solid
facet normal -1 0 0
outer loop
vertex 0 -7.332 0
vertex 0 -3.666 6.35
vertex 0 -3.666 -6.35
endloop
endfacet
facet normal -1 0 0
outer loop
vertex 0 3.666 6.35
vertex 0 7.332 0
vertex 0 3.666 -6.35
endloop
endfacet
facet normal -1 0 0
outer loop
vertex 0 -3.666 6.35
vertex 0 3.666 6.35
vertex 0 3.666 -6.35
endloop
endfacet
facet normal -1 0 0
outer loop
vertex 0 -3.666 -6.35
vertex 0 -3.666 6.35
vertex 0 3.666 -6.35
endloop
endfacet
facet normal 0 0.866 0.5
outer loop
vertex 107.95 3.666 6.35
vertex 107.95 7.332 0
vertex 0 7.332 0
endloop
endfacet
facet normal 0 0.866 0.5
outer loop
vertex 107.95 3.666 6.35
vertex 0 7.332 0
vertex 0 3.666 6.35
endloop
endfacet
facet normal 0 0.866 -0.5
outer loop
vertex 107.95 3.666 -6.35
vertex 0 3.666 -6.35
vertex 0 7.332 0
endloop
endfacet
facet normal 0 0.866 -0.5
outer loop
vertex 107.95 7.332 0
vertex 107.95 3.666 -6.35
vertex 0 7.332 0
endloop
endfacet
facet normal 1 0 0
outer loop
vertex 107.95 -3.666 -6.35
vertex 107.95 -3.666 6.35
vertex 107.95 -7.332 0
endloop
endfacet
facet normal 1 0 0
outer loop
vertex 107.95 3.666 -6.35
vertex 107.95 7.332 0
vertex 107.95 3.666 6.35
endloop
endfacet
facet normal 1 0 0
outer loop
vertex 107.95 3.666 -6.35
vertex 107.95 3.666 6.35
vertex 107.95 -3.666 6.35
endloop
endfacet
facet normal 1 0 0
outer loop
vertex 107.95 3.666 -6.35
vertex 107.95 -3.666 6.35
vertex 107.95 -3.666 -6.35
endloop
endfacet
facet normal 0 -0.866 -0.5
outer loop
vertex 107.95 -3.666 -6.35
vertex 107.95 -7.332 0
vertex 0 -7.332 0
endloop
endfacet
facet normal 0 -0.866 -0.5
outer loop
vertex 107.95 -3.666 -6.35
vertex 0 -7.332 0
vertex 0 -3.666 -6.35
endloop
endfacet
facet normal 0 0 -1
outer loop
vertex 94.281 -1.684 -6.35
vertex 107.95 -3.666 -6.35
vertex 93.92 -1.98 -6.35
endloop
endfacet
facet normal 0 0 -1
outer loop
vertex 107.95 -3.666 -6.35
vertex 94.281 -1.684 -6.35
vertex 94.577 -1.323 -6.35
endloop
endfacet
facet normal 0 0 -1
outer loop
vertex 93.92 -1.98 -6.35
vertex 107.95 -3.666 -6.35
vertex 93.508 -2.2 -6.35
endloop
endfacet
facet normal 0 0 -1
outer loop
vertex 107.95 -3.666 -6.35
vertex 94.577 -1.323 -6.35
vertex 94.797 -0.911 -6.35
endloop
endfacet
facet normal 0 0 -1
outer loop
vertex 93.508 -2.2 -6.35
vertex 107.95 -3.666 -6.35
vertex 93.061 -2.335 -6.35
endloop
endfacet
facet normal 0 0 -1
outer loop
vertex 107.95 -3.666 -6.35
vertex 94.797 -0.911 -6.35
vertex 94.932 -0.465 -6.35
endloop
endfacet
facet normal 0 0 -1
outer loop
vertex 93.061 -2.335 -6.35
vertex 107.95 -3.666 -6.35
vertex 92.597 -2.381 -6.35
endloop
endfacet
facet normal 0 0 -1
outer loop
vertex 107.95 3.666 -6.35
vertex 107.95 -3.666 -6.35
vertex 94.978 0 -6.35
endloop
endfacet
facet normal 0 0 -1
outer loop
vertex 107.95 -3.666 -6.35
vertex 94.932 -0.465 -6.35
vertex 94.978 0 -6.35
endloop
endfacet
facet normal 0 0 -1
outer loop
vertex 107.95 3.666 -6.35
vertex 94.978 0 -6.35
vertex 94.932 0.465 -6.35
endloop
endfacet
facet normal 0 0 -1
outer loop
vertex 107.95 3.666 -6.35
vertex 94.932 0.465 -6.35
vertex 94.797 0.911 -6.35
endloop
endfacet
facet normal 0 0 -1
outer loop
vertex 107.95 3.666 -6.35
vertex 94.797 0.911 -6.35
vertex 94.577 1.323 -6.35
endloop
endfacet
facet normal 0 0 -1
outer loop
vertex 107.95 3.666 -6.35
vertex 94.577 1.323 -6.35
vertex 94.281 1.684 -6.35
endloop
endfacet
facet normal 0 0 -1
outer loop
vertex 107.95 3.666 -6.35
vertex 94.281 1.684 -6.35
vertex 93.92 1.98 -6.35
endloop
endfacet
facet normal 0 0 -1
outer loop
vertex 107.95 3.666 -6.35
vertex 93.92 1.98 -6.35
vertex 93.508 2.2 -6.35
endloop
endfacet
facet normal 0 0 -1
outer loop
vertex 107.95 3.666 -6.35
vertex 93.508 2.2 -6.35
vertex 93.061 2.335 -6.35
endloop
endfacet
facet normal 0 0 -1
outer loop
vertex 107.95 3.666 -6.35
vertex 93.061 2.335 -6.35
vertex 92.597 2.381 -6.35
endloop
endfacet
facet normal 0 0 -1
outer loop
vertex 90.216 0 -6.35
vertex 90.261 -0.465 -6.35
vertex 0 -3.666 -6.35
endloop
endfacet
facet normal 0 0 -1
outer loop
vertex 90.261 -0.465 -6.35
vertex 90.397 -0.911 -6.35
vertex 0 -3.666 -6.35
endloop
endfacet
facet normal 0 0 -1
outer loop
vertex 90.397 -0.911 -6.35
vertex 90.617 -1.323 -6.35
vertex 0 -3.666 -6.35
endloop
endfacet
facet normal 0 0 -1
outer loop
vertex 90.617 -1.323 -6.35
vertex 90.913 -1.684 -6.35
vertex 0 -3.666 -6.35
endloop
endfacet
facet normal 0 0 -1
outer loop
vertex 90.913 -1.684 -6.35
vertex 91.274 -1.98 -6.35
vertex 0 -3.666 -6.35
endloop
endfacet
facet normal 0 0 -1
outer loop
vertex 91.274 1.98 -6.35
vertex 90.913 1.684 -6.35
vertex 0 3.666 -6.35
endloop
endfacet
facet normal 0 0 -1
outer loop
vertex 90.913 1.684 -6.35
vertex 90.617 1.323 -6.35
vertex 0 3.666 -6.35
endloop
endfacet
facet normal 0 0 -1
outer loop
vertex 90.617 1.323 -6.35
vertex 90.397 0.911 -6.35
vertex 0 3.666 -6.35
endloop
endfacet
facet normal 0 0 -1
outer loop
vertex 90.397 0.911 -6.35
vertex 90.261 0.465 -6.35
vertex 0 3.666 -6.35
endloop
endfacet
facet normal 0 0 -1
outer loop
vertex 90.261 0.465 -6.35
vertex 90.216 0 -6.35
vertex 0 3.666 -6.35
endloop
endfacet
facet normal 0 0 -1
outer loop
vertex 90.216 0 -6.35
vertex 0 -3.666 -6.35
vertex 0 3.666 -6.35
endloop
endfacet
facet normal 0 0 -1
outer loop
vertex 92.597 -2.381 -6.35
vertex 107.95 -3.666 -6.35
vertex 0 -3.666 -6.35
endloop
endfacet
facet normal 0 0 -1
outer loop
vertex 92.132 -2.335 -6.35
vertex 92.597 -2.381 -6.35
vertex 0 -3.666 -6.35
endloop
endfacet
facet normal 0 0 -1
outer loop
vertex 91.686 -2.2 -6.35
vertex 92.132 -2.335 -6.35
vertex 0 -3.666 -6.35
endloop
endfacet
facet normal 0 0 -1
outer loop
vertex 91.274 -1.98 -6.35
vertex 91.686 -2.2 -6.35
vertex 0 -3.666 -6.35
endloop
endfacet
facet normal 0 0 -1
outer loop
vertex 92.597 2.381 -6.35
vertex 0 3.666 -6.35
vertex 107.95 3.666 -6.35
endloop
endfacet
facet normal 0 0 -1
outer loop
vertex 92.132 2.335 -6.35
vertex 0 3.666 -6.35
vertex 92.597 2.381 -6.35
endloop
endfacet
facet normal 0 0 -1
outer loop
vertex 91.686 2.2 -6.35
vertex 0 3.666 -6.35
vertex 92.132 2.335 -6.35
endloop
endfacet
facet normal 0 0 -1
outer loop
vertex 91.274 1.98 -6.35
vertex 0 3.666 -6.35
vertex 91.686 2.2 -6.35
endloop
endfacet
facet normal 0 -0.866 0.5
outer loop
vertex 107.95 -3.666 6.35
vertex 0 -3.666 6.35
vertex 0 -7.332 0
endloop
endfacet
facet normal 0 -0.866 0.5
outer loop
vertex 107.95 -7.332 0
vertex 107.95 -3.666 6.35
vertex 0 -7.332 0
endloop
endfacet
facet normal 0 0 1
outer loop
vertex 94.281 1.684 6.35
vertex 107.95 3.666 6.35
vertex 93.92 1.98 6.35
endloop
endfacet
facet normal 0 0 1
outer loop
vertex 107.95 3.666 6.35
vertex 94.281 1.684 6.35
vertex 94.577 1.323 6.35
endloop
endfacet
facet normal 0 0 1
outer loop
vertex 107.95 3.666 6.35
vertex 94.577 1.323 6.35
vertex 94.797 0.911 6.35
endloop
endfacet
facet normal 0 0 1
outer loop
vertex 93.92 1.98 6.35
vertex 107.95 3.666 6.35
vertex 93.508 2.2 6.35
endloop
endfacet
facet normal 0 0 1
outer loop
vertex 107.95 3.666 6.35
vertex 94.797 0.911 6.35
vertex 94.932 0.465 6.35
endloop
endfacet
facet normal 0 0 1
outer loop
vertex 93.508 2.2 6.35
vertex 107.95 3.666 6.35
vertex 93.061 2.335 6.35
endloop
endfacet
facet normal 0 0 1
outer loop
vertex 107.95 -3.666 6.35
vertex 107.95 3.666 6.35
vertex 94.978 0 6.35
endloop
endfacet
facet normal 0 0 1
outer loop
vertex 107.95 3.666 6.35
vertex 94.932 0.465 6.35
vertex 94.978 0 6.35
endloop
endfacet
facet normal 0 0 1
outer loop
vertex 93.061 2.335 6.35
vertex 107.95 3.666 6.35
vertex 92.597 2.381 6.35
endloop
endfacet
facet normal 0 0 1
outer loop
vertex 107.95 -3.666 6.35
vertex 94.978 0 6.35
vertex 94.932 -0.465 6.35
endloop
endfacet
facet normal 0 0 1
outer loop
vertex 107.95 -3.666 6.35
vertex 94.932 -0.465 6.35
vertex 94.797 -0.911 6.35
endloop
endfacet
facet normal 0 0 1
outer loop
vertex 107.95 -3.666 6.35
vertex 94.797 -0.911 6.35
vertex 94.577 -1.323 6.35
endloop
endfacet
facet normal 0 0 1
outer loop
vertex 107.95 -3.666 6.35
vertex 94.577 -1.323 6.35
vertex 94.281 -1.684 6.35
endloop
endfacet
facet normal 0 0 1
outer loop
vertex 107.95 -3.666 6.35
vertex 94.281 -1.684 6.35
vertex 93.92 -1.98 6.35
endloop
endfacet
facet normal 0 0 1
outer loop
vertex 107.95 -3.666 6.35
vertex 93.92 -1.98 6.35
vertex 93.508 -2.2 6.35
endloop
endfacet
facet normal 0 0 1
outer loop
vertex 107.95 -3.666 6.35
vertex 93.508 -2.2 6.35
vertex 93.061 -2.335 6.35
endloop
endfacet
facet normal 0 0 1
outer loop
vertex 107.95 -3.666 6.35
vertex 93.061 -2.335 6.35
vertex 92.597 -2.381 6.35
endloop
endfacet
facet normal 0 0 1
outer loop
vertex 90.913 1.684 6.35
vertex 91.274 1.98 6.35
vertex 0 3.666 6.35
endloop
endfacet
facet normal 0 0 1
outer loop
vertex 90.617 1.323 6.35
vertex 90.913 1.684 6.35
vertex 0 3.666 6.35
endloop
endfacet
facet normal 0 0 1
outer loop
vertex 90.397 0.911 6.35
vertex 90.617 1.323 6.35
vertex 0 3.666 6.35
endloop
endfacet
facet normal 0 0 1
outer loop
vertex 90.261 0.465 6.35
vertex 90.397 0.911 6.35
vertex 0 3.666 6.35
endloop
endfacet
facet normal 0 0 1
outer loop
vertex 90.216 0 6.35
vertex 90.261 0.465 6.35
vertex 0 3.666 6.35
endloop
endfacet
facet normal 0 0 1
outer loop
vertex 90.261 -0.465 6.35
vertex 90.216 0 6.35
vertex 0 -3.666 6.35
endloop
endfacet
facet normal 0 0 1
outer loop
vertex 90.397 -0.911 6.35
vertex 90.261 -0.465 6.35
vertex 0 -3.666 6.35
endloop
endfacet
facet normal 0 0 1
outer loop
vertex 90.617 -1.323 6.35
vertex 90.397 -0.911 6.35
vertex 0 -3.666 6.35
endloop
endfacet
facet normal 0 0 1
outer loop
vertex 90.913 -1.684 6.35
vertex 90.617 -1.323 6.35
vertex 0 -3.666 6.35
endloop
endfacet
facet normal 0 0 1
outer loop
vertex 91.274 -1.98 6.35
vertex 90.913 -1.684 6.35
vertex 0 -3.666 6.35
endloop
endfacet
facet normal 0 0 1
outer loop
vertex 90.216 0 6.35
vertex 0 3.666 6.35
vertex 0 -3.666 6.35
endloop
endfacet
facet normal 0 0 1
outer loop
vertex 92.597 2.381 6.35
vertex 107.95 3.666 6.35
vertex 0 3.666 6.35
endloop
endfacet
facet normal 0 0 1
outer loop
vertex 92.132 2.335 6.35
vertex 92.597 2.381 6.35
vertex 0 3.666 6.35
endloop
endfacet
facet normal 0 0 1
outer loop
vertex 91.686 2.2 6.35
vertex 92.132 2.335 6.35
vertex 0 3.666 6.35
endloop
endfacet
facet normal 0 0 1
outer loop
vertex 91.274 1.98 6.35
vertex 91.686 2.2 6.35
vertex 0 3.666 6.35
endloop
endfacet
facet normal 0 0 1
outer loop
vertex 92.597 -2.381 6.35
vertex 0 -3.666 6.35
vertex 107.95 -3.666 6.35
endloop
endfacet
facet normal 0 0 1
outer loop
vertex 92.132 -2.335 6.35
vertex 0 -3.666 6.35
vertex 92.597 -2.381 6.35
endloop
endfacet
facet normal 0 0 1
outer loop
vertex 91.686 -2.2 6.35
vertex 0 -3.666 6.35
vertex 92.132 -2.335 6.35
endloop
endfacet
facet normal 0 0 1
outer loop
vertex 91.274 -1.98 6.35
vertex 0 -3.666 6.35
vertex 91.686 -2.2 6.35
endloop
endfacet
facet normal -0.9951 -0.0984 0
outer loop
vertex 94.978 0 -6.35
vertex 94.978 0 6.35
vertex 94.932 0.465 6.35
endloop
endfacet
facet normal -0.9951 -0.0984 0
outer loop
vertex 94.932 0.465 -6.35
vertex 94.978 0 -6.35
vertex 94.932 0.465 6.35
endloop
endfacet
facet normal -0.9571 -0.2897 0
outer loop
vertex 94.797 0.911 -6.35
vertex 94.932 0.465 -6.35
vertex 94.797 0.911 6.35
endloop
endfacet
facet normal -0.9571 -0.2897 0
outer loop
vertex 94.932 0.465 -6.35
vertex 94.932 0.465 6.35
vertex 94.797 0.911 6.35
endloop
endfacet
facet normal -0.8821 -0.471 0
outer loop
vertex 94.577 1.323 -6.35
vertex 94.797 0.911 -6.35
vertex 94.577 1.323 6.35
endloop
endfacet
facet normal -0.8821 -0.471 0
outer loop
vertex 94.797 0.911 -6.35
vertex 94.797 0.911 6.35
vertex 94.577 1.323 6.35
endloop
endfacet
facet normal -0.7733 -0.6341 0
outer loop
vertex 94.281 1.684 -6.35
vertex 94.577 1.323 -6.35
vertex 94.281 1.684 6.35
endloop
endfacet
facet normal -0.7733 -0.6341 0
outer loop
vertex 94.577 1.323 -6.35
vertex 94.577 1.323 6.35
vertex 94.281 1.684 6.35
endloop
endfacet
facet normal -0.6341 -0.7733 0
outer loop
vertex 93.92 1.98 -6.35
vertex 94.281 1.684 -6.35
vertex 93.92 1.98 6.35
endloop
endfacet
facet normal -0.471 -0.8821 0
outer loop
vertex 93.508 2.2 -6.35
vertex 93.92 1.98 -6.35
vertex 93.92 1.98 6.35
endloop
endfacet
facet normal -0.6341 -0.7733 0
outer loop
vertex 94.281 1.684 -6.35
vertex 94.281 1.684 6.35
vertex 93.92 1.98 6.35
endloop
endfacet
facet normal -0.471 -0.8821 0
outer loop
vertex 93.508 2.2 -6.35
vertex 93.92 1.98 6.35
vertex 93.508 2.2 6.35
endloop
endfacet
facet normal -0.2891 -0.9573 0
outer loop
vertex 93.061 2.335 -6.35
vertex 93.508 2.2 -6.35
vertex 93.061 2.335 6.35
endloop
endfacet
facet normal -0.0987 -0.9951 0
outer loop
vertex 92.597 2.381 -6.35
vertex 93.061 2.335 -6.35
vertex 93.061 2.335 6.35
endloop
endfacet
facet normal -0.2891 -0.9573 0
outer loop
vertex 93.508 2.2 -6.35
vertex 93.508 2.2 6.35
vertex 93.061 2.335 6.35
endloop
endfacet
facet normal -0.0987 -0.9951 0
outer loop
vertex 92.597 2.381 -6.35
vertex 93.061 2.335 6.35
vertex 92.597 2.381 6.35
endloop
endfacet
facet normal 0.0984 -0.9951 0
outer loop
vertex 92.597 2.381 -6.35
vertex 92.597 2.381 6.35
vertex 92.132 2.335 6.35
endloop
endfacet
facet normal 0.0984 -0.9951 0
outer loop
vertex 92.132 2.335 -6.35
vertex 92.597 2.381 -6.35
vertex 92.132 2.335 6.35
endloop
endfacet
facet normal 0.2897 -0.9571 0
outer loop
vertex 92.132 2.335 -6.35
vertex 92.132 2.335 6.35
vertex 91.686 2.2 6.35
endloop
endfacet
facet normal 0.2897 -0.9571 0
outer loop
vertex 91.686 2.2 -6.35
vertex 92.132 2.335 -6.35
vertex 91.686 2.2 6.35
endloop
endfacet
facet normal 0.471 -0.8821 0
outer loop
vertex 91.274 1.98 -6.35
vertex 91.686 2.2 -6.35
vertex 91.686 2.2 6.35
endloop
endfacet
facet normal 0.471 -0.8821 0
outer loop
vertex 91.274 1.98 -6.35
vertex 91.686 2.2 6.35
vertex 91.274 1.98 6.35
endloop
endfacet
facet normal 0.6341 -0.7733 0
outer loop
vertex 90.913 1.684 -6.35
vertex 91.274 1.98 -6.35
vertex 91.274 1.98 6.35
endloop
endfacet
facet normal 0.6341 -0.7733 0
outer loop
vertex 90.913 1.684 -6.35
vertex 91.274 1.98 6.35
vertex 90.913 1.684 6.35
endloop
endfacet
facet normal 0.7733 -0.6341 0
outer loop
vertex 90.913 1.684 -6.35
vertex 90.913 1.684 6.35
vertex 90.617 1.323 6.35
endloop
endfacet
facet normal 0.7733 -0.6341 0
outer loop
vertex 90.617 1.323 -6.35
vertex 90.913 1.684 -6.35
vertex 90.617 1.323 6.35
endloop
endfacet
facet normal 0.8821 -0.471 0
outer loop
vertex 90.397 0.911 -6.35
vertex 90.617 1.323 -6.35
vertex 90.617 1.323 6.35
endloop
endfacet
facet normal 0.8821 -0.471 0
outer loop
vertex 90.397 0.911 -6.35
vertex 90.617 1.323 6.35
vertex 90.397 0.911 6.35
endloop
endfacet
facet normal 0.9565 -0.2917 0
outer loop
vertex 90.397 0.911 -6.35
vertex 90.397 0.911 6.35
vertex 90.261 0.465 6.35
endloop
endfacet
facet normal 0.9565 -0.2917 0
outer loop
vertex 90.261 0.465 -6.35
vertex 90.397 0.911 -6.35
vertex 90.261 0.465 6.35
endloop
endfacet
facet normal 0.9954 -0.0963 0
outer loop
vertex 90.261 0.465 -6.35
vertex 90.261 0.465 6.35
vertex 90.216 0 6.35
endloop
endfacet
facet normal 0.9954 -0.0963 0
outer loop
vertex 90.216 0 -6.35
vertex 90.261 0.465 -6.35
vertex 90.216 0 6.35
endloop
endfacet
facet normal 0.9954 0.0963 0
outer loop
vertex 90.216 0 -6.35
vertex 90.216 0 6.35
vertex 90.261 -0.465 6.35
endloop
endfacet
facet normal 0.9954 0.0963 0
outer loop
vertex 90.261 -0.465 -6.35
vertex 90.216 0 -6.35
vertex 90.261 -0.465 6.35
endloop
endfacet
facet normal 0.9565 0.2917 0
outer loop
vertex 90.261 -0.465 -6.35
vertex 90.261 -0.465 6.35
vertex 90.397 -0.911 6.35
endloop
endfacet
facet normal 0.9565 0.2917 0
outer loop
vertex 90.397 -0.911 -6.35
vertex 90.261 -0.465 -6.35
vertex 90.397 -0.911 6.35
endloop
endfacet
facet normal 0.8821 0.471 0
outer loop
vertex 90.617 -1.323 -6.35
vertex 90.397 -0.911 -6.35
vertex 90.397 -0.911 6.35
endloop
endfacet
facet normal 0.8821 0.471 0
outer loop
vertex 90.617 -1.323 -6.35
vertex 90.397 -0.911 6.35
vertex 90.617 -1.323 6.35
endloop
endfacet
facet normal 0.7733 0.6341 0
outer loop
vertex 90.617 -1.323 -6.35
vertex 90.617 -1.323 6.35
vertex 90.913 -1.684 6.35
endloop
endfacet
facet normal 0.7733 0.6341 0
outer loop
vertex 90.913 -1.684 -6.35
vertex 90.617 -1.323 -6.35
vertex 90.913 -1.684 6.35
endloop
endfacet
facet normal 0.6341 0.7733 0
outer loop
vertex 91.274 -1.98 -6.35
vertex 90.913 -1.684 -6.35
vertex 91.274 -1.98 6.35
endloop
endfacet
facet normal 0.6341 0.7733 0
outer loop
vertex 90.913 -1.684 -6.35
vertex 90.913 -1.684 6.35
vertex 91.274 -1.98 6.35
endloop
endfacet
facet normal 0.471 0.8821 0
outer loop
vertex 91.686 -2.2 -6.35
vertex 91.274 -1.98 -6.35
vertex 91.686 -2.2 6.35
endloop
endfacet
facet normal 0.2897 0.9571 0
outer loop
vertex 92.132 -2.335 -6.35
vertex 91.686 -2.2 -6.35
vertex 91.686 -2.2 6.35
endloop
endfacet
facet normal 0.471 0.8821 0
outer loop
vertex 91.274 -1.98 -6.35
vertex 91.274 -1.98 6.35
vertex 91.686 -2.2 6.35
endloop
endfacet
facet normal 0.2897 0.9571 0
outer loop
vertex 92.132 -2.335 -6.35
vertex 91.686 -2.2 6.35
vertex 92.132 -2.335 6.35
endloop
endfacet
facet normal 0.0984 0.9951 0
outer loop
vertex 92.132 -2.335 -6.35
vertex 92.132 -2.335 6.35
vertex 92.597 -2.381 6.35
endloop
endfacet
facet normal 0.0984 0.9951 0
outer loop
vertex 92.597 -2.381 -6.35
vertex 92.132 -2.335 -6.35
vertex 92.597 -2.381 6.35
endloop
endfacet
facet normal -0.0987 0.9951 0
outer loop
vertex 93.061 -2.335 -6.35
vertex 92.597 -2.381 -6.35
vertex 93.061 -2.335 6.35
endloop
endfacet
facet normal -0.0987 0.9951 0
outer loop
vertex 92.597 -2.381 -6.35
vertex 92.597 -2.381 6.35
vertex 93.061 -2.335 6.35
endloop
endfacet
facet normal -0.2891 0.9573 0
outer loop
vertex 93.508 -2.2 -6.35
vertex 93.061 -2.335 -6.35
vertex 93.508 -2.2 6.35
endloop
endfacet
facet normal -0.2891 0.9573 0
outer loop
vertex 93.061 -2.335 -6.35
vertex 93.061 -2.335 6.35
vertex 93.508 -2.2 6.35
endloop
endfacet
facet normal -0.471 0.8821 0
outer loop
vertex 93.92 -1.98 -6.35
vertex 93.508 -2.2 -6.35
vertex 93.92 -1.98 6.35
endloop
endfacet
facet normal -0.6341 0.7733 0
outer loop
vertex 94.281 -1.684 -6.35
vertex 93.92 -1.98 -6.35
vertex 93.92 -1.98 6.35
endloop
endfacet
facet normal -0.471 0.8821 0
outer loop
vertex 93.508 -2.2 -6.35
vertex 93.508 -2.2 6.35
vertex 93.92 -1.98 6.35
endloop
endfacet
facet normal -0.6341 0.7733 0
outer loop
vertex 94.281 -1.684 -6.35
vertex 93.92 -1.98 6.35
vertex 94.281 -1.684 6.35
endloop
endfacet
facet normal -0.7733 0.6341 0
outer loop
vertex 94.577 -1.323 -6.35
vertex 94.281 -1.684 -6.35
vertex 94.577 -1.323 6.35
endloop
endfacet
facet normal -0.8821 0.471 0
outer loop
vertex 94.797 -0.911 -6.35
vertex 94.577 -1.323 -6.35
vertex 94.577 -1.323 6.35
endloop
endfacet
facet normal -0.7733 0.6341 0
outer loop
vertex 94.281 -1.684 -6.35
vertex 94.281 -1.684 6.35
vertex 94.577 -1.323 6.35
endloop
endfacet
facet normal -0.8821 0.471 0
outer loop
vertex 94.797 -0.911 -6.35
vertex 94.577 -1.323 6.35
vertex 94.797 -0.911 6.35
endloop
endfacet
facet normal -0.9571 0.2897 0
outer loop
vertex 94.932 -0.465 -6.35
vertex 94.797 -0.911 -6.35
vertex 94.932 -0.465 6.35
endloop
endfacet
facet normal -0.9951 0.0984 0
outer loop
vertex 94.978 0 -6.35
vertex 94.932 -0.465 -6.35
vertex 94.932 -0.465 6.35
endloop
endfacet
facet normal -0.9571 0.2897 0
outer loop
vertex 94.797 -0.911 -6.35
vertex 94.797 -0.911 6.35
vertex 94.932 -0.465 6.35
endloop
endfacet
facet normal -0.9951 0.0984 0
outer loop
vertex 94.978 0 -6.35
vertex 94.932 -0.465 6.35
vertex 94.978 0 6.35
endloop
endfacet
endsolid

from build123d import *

# Parameters (mm, degrees)
BOSS_EXTRUDE1_DEPTH = 107.95
SKETCH2_R           = 2.38125
CUT_EXTRUDE1_DEPTH  = 109.941524835


with BuildPart() as part:
    # Sketch1 → Boss-Extrude1 (new body)
    with BuildSketch(Plane(origin=(0, 0, 0), x_dir=(0, 0, -1), z_dir=(1, 0, 0))):
        Polygon((6.35, -3.666174209), (6.35, 3.666174209), (0, 7.332348419), (-6.35, 3.666174209), (-6.35, -3.666174209), (0, -7.332348419), align=None)
    extrude(amount=BOSS_EXTRUDE1_DEPTH)

    # Sketch2 → Cut-Extrude1 (cut, through all)
    with BuildSketch(Plane.XY.offset(6.35)):
        with Locations((92.5968176, 0)):
            Circle(SKETCH2_R)
    extrude(amount=-CUT_EXTRUDE1_DEPTH, mode=Mode.SUBTRACT)


solid = part.part
